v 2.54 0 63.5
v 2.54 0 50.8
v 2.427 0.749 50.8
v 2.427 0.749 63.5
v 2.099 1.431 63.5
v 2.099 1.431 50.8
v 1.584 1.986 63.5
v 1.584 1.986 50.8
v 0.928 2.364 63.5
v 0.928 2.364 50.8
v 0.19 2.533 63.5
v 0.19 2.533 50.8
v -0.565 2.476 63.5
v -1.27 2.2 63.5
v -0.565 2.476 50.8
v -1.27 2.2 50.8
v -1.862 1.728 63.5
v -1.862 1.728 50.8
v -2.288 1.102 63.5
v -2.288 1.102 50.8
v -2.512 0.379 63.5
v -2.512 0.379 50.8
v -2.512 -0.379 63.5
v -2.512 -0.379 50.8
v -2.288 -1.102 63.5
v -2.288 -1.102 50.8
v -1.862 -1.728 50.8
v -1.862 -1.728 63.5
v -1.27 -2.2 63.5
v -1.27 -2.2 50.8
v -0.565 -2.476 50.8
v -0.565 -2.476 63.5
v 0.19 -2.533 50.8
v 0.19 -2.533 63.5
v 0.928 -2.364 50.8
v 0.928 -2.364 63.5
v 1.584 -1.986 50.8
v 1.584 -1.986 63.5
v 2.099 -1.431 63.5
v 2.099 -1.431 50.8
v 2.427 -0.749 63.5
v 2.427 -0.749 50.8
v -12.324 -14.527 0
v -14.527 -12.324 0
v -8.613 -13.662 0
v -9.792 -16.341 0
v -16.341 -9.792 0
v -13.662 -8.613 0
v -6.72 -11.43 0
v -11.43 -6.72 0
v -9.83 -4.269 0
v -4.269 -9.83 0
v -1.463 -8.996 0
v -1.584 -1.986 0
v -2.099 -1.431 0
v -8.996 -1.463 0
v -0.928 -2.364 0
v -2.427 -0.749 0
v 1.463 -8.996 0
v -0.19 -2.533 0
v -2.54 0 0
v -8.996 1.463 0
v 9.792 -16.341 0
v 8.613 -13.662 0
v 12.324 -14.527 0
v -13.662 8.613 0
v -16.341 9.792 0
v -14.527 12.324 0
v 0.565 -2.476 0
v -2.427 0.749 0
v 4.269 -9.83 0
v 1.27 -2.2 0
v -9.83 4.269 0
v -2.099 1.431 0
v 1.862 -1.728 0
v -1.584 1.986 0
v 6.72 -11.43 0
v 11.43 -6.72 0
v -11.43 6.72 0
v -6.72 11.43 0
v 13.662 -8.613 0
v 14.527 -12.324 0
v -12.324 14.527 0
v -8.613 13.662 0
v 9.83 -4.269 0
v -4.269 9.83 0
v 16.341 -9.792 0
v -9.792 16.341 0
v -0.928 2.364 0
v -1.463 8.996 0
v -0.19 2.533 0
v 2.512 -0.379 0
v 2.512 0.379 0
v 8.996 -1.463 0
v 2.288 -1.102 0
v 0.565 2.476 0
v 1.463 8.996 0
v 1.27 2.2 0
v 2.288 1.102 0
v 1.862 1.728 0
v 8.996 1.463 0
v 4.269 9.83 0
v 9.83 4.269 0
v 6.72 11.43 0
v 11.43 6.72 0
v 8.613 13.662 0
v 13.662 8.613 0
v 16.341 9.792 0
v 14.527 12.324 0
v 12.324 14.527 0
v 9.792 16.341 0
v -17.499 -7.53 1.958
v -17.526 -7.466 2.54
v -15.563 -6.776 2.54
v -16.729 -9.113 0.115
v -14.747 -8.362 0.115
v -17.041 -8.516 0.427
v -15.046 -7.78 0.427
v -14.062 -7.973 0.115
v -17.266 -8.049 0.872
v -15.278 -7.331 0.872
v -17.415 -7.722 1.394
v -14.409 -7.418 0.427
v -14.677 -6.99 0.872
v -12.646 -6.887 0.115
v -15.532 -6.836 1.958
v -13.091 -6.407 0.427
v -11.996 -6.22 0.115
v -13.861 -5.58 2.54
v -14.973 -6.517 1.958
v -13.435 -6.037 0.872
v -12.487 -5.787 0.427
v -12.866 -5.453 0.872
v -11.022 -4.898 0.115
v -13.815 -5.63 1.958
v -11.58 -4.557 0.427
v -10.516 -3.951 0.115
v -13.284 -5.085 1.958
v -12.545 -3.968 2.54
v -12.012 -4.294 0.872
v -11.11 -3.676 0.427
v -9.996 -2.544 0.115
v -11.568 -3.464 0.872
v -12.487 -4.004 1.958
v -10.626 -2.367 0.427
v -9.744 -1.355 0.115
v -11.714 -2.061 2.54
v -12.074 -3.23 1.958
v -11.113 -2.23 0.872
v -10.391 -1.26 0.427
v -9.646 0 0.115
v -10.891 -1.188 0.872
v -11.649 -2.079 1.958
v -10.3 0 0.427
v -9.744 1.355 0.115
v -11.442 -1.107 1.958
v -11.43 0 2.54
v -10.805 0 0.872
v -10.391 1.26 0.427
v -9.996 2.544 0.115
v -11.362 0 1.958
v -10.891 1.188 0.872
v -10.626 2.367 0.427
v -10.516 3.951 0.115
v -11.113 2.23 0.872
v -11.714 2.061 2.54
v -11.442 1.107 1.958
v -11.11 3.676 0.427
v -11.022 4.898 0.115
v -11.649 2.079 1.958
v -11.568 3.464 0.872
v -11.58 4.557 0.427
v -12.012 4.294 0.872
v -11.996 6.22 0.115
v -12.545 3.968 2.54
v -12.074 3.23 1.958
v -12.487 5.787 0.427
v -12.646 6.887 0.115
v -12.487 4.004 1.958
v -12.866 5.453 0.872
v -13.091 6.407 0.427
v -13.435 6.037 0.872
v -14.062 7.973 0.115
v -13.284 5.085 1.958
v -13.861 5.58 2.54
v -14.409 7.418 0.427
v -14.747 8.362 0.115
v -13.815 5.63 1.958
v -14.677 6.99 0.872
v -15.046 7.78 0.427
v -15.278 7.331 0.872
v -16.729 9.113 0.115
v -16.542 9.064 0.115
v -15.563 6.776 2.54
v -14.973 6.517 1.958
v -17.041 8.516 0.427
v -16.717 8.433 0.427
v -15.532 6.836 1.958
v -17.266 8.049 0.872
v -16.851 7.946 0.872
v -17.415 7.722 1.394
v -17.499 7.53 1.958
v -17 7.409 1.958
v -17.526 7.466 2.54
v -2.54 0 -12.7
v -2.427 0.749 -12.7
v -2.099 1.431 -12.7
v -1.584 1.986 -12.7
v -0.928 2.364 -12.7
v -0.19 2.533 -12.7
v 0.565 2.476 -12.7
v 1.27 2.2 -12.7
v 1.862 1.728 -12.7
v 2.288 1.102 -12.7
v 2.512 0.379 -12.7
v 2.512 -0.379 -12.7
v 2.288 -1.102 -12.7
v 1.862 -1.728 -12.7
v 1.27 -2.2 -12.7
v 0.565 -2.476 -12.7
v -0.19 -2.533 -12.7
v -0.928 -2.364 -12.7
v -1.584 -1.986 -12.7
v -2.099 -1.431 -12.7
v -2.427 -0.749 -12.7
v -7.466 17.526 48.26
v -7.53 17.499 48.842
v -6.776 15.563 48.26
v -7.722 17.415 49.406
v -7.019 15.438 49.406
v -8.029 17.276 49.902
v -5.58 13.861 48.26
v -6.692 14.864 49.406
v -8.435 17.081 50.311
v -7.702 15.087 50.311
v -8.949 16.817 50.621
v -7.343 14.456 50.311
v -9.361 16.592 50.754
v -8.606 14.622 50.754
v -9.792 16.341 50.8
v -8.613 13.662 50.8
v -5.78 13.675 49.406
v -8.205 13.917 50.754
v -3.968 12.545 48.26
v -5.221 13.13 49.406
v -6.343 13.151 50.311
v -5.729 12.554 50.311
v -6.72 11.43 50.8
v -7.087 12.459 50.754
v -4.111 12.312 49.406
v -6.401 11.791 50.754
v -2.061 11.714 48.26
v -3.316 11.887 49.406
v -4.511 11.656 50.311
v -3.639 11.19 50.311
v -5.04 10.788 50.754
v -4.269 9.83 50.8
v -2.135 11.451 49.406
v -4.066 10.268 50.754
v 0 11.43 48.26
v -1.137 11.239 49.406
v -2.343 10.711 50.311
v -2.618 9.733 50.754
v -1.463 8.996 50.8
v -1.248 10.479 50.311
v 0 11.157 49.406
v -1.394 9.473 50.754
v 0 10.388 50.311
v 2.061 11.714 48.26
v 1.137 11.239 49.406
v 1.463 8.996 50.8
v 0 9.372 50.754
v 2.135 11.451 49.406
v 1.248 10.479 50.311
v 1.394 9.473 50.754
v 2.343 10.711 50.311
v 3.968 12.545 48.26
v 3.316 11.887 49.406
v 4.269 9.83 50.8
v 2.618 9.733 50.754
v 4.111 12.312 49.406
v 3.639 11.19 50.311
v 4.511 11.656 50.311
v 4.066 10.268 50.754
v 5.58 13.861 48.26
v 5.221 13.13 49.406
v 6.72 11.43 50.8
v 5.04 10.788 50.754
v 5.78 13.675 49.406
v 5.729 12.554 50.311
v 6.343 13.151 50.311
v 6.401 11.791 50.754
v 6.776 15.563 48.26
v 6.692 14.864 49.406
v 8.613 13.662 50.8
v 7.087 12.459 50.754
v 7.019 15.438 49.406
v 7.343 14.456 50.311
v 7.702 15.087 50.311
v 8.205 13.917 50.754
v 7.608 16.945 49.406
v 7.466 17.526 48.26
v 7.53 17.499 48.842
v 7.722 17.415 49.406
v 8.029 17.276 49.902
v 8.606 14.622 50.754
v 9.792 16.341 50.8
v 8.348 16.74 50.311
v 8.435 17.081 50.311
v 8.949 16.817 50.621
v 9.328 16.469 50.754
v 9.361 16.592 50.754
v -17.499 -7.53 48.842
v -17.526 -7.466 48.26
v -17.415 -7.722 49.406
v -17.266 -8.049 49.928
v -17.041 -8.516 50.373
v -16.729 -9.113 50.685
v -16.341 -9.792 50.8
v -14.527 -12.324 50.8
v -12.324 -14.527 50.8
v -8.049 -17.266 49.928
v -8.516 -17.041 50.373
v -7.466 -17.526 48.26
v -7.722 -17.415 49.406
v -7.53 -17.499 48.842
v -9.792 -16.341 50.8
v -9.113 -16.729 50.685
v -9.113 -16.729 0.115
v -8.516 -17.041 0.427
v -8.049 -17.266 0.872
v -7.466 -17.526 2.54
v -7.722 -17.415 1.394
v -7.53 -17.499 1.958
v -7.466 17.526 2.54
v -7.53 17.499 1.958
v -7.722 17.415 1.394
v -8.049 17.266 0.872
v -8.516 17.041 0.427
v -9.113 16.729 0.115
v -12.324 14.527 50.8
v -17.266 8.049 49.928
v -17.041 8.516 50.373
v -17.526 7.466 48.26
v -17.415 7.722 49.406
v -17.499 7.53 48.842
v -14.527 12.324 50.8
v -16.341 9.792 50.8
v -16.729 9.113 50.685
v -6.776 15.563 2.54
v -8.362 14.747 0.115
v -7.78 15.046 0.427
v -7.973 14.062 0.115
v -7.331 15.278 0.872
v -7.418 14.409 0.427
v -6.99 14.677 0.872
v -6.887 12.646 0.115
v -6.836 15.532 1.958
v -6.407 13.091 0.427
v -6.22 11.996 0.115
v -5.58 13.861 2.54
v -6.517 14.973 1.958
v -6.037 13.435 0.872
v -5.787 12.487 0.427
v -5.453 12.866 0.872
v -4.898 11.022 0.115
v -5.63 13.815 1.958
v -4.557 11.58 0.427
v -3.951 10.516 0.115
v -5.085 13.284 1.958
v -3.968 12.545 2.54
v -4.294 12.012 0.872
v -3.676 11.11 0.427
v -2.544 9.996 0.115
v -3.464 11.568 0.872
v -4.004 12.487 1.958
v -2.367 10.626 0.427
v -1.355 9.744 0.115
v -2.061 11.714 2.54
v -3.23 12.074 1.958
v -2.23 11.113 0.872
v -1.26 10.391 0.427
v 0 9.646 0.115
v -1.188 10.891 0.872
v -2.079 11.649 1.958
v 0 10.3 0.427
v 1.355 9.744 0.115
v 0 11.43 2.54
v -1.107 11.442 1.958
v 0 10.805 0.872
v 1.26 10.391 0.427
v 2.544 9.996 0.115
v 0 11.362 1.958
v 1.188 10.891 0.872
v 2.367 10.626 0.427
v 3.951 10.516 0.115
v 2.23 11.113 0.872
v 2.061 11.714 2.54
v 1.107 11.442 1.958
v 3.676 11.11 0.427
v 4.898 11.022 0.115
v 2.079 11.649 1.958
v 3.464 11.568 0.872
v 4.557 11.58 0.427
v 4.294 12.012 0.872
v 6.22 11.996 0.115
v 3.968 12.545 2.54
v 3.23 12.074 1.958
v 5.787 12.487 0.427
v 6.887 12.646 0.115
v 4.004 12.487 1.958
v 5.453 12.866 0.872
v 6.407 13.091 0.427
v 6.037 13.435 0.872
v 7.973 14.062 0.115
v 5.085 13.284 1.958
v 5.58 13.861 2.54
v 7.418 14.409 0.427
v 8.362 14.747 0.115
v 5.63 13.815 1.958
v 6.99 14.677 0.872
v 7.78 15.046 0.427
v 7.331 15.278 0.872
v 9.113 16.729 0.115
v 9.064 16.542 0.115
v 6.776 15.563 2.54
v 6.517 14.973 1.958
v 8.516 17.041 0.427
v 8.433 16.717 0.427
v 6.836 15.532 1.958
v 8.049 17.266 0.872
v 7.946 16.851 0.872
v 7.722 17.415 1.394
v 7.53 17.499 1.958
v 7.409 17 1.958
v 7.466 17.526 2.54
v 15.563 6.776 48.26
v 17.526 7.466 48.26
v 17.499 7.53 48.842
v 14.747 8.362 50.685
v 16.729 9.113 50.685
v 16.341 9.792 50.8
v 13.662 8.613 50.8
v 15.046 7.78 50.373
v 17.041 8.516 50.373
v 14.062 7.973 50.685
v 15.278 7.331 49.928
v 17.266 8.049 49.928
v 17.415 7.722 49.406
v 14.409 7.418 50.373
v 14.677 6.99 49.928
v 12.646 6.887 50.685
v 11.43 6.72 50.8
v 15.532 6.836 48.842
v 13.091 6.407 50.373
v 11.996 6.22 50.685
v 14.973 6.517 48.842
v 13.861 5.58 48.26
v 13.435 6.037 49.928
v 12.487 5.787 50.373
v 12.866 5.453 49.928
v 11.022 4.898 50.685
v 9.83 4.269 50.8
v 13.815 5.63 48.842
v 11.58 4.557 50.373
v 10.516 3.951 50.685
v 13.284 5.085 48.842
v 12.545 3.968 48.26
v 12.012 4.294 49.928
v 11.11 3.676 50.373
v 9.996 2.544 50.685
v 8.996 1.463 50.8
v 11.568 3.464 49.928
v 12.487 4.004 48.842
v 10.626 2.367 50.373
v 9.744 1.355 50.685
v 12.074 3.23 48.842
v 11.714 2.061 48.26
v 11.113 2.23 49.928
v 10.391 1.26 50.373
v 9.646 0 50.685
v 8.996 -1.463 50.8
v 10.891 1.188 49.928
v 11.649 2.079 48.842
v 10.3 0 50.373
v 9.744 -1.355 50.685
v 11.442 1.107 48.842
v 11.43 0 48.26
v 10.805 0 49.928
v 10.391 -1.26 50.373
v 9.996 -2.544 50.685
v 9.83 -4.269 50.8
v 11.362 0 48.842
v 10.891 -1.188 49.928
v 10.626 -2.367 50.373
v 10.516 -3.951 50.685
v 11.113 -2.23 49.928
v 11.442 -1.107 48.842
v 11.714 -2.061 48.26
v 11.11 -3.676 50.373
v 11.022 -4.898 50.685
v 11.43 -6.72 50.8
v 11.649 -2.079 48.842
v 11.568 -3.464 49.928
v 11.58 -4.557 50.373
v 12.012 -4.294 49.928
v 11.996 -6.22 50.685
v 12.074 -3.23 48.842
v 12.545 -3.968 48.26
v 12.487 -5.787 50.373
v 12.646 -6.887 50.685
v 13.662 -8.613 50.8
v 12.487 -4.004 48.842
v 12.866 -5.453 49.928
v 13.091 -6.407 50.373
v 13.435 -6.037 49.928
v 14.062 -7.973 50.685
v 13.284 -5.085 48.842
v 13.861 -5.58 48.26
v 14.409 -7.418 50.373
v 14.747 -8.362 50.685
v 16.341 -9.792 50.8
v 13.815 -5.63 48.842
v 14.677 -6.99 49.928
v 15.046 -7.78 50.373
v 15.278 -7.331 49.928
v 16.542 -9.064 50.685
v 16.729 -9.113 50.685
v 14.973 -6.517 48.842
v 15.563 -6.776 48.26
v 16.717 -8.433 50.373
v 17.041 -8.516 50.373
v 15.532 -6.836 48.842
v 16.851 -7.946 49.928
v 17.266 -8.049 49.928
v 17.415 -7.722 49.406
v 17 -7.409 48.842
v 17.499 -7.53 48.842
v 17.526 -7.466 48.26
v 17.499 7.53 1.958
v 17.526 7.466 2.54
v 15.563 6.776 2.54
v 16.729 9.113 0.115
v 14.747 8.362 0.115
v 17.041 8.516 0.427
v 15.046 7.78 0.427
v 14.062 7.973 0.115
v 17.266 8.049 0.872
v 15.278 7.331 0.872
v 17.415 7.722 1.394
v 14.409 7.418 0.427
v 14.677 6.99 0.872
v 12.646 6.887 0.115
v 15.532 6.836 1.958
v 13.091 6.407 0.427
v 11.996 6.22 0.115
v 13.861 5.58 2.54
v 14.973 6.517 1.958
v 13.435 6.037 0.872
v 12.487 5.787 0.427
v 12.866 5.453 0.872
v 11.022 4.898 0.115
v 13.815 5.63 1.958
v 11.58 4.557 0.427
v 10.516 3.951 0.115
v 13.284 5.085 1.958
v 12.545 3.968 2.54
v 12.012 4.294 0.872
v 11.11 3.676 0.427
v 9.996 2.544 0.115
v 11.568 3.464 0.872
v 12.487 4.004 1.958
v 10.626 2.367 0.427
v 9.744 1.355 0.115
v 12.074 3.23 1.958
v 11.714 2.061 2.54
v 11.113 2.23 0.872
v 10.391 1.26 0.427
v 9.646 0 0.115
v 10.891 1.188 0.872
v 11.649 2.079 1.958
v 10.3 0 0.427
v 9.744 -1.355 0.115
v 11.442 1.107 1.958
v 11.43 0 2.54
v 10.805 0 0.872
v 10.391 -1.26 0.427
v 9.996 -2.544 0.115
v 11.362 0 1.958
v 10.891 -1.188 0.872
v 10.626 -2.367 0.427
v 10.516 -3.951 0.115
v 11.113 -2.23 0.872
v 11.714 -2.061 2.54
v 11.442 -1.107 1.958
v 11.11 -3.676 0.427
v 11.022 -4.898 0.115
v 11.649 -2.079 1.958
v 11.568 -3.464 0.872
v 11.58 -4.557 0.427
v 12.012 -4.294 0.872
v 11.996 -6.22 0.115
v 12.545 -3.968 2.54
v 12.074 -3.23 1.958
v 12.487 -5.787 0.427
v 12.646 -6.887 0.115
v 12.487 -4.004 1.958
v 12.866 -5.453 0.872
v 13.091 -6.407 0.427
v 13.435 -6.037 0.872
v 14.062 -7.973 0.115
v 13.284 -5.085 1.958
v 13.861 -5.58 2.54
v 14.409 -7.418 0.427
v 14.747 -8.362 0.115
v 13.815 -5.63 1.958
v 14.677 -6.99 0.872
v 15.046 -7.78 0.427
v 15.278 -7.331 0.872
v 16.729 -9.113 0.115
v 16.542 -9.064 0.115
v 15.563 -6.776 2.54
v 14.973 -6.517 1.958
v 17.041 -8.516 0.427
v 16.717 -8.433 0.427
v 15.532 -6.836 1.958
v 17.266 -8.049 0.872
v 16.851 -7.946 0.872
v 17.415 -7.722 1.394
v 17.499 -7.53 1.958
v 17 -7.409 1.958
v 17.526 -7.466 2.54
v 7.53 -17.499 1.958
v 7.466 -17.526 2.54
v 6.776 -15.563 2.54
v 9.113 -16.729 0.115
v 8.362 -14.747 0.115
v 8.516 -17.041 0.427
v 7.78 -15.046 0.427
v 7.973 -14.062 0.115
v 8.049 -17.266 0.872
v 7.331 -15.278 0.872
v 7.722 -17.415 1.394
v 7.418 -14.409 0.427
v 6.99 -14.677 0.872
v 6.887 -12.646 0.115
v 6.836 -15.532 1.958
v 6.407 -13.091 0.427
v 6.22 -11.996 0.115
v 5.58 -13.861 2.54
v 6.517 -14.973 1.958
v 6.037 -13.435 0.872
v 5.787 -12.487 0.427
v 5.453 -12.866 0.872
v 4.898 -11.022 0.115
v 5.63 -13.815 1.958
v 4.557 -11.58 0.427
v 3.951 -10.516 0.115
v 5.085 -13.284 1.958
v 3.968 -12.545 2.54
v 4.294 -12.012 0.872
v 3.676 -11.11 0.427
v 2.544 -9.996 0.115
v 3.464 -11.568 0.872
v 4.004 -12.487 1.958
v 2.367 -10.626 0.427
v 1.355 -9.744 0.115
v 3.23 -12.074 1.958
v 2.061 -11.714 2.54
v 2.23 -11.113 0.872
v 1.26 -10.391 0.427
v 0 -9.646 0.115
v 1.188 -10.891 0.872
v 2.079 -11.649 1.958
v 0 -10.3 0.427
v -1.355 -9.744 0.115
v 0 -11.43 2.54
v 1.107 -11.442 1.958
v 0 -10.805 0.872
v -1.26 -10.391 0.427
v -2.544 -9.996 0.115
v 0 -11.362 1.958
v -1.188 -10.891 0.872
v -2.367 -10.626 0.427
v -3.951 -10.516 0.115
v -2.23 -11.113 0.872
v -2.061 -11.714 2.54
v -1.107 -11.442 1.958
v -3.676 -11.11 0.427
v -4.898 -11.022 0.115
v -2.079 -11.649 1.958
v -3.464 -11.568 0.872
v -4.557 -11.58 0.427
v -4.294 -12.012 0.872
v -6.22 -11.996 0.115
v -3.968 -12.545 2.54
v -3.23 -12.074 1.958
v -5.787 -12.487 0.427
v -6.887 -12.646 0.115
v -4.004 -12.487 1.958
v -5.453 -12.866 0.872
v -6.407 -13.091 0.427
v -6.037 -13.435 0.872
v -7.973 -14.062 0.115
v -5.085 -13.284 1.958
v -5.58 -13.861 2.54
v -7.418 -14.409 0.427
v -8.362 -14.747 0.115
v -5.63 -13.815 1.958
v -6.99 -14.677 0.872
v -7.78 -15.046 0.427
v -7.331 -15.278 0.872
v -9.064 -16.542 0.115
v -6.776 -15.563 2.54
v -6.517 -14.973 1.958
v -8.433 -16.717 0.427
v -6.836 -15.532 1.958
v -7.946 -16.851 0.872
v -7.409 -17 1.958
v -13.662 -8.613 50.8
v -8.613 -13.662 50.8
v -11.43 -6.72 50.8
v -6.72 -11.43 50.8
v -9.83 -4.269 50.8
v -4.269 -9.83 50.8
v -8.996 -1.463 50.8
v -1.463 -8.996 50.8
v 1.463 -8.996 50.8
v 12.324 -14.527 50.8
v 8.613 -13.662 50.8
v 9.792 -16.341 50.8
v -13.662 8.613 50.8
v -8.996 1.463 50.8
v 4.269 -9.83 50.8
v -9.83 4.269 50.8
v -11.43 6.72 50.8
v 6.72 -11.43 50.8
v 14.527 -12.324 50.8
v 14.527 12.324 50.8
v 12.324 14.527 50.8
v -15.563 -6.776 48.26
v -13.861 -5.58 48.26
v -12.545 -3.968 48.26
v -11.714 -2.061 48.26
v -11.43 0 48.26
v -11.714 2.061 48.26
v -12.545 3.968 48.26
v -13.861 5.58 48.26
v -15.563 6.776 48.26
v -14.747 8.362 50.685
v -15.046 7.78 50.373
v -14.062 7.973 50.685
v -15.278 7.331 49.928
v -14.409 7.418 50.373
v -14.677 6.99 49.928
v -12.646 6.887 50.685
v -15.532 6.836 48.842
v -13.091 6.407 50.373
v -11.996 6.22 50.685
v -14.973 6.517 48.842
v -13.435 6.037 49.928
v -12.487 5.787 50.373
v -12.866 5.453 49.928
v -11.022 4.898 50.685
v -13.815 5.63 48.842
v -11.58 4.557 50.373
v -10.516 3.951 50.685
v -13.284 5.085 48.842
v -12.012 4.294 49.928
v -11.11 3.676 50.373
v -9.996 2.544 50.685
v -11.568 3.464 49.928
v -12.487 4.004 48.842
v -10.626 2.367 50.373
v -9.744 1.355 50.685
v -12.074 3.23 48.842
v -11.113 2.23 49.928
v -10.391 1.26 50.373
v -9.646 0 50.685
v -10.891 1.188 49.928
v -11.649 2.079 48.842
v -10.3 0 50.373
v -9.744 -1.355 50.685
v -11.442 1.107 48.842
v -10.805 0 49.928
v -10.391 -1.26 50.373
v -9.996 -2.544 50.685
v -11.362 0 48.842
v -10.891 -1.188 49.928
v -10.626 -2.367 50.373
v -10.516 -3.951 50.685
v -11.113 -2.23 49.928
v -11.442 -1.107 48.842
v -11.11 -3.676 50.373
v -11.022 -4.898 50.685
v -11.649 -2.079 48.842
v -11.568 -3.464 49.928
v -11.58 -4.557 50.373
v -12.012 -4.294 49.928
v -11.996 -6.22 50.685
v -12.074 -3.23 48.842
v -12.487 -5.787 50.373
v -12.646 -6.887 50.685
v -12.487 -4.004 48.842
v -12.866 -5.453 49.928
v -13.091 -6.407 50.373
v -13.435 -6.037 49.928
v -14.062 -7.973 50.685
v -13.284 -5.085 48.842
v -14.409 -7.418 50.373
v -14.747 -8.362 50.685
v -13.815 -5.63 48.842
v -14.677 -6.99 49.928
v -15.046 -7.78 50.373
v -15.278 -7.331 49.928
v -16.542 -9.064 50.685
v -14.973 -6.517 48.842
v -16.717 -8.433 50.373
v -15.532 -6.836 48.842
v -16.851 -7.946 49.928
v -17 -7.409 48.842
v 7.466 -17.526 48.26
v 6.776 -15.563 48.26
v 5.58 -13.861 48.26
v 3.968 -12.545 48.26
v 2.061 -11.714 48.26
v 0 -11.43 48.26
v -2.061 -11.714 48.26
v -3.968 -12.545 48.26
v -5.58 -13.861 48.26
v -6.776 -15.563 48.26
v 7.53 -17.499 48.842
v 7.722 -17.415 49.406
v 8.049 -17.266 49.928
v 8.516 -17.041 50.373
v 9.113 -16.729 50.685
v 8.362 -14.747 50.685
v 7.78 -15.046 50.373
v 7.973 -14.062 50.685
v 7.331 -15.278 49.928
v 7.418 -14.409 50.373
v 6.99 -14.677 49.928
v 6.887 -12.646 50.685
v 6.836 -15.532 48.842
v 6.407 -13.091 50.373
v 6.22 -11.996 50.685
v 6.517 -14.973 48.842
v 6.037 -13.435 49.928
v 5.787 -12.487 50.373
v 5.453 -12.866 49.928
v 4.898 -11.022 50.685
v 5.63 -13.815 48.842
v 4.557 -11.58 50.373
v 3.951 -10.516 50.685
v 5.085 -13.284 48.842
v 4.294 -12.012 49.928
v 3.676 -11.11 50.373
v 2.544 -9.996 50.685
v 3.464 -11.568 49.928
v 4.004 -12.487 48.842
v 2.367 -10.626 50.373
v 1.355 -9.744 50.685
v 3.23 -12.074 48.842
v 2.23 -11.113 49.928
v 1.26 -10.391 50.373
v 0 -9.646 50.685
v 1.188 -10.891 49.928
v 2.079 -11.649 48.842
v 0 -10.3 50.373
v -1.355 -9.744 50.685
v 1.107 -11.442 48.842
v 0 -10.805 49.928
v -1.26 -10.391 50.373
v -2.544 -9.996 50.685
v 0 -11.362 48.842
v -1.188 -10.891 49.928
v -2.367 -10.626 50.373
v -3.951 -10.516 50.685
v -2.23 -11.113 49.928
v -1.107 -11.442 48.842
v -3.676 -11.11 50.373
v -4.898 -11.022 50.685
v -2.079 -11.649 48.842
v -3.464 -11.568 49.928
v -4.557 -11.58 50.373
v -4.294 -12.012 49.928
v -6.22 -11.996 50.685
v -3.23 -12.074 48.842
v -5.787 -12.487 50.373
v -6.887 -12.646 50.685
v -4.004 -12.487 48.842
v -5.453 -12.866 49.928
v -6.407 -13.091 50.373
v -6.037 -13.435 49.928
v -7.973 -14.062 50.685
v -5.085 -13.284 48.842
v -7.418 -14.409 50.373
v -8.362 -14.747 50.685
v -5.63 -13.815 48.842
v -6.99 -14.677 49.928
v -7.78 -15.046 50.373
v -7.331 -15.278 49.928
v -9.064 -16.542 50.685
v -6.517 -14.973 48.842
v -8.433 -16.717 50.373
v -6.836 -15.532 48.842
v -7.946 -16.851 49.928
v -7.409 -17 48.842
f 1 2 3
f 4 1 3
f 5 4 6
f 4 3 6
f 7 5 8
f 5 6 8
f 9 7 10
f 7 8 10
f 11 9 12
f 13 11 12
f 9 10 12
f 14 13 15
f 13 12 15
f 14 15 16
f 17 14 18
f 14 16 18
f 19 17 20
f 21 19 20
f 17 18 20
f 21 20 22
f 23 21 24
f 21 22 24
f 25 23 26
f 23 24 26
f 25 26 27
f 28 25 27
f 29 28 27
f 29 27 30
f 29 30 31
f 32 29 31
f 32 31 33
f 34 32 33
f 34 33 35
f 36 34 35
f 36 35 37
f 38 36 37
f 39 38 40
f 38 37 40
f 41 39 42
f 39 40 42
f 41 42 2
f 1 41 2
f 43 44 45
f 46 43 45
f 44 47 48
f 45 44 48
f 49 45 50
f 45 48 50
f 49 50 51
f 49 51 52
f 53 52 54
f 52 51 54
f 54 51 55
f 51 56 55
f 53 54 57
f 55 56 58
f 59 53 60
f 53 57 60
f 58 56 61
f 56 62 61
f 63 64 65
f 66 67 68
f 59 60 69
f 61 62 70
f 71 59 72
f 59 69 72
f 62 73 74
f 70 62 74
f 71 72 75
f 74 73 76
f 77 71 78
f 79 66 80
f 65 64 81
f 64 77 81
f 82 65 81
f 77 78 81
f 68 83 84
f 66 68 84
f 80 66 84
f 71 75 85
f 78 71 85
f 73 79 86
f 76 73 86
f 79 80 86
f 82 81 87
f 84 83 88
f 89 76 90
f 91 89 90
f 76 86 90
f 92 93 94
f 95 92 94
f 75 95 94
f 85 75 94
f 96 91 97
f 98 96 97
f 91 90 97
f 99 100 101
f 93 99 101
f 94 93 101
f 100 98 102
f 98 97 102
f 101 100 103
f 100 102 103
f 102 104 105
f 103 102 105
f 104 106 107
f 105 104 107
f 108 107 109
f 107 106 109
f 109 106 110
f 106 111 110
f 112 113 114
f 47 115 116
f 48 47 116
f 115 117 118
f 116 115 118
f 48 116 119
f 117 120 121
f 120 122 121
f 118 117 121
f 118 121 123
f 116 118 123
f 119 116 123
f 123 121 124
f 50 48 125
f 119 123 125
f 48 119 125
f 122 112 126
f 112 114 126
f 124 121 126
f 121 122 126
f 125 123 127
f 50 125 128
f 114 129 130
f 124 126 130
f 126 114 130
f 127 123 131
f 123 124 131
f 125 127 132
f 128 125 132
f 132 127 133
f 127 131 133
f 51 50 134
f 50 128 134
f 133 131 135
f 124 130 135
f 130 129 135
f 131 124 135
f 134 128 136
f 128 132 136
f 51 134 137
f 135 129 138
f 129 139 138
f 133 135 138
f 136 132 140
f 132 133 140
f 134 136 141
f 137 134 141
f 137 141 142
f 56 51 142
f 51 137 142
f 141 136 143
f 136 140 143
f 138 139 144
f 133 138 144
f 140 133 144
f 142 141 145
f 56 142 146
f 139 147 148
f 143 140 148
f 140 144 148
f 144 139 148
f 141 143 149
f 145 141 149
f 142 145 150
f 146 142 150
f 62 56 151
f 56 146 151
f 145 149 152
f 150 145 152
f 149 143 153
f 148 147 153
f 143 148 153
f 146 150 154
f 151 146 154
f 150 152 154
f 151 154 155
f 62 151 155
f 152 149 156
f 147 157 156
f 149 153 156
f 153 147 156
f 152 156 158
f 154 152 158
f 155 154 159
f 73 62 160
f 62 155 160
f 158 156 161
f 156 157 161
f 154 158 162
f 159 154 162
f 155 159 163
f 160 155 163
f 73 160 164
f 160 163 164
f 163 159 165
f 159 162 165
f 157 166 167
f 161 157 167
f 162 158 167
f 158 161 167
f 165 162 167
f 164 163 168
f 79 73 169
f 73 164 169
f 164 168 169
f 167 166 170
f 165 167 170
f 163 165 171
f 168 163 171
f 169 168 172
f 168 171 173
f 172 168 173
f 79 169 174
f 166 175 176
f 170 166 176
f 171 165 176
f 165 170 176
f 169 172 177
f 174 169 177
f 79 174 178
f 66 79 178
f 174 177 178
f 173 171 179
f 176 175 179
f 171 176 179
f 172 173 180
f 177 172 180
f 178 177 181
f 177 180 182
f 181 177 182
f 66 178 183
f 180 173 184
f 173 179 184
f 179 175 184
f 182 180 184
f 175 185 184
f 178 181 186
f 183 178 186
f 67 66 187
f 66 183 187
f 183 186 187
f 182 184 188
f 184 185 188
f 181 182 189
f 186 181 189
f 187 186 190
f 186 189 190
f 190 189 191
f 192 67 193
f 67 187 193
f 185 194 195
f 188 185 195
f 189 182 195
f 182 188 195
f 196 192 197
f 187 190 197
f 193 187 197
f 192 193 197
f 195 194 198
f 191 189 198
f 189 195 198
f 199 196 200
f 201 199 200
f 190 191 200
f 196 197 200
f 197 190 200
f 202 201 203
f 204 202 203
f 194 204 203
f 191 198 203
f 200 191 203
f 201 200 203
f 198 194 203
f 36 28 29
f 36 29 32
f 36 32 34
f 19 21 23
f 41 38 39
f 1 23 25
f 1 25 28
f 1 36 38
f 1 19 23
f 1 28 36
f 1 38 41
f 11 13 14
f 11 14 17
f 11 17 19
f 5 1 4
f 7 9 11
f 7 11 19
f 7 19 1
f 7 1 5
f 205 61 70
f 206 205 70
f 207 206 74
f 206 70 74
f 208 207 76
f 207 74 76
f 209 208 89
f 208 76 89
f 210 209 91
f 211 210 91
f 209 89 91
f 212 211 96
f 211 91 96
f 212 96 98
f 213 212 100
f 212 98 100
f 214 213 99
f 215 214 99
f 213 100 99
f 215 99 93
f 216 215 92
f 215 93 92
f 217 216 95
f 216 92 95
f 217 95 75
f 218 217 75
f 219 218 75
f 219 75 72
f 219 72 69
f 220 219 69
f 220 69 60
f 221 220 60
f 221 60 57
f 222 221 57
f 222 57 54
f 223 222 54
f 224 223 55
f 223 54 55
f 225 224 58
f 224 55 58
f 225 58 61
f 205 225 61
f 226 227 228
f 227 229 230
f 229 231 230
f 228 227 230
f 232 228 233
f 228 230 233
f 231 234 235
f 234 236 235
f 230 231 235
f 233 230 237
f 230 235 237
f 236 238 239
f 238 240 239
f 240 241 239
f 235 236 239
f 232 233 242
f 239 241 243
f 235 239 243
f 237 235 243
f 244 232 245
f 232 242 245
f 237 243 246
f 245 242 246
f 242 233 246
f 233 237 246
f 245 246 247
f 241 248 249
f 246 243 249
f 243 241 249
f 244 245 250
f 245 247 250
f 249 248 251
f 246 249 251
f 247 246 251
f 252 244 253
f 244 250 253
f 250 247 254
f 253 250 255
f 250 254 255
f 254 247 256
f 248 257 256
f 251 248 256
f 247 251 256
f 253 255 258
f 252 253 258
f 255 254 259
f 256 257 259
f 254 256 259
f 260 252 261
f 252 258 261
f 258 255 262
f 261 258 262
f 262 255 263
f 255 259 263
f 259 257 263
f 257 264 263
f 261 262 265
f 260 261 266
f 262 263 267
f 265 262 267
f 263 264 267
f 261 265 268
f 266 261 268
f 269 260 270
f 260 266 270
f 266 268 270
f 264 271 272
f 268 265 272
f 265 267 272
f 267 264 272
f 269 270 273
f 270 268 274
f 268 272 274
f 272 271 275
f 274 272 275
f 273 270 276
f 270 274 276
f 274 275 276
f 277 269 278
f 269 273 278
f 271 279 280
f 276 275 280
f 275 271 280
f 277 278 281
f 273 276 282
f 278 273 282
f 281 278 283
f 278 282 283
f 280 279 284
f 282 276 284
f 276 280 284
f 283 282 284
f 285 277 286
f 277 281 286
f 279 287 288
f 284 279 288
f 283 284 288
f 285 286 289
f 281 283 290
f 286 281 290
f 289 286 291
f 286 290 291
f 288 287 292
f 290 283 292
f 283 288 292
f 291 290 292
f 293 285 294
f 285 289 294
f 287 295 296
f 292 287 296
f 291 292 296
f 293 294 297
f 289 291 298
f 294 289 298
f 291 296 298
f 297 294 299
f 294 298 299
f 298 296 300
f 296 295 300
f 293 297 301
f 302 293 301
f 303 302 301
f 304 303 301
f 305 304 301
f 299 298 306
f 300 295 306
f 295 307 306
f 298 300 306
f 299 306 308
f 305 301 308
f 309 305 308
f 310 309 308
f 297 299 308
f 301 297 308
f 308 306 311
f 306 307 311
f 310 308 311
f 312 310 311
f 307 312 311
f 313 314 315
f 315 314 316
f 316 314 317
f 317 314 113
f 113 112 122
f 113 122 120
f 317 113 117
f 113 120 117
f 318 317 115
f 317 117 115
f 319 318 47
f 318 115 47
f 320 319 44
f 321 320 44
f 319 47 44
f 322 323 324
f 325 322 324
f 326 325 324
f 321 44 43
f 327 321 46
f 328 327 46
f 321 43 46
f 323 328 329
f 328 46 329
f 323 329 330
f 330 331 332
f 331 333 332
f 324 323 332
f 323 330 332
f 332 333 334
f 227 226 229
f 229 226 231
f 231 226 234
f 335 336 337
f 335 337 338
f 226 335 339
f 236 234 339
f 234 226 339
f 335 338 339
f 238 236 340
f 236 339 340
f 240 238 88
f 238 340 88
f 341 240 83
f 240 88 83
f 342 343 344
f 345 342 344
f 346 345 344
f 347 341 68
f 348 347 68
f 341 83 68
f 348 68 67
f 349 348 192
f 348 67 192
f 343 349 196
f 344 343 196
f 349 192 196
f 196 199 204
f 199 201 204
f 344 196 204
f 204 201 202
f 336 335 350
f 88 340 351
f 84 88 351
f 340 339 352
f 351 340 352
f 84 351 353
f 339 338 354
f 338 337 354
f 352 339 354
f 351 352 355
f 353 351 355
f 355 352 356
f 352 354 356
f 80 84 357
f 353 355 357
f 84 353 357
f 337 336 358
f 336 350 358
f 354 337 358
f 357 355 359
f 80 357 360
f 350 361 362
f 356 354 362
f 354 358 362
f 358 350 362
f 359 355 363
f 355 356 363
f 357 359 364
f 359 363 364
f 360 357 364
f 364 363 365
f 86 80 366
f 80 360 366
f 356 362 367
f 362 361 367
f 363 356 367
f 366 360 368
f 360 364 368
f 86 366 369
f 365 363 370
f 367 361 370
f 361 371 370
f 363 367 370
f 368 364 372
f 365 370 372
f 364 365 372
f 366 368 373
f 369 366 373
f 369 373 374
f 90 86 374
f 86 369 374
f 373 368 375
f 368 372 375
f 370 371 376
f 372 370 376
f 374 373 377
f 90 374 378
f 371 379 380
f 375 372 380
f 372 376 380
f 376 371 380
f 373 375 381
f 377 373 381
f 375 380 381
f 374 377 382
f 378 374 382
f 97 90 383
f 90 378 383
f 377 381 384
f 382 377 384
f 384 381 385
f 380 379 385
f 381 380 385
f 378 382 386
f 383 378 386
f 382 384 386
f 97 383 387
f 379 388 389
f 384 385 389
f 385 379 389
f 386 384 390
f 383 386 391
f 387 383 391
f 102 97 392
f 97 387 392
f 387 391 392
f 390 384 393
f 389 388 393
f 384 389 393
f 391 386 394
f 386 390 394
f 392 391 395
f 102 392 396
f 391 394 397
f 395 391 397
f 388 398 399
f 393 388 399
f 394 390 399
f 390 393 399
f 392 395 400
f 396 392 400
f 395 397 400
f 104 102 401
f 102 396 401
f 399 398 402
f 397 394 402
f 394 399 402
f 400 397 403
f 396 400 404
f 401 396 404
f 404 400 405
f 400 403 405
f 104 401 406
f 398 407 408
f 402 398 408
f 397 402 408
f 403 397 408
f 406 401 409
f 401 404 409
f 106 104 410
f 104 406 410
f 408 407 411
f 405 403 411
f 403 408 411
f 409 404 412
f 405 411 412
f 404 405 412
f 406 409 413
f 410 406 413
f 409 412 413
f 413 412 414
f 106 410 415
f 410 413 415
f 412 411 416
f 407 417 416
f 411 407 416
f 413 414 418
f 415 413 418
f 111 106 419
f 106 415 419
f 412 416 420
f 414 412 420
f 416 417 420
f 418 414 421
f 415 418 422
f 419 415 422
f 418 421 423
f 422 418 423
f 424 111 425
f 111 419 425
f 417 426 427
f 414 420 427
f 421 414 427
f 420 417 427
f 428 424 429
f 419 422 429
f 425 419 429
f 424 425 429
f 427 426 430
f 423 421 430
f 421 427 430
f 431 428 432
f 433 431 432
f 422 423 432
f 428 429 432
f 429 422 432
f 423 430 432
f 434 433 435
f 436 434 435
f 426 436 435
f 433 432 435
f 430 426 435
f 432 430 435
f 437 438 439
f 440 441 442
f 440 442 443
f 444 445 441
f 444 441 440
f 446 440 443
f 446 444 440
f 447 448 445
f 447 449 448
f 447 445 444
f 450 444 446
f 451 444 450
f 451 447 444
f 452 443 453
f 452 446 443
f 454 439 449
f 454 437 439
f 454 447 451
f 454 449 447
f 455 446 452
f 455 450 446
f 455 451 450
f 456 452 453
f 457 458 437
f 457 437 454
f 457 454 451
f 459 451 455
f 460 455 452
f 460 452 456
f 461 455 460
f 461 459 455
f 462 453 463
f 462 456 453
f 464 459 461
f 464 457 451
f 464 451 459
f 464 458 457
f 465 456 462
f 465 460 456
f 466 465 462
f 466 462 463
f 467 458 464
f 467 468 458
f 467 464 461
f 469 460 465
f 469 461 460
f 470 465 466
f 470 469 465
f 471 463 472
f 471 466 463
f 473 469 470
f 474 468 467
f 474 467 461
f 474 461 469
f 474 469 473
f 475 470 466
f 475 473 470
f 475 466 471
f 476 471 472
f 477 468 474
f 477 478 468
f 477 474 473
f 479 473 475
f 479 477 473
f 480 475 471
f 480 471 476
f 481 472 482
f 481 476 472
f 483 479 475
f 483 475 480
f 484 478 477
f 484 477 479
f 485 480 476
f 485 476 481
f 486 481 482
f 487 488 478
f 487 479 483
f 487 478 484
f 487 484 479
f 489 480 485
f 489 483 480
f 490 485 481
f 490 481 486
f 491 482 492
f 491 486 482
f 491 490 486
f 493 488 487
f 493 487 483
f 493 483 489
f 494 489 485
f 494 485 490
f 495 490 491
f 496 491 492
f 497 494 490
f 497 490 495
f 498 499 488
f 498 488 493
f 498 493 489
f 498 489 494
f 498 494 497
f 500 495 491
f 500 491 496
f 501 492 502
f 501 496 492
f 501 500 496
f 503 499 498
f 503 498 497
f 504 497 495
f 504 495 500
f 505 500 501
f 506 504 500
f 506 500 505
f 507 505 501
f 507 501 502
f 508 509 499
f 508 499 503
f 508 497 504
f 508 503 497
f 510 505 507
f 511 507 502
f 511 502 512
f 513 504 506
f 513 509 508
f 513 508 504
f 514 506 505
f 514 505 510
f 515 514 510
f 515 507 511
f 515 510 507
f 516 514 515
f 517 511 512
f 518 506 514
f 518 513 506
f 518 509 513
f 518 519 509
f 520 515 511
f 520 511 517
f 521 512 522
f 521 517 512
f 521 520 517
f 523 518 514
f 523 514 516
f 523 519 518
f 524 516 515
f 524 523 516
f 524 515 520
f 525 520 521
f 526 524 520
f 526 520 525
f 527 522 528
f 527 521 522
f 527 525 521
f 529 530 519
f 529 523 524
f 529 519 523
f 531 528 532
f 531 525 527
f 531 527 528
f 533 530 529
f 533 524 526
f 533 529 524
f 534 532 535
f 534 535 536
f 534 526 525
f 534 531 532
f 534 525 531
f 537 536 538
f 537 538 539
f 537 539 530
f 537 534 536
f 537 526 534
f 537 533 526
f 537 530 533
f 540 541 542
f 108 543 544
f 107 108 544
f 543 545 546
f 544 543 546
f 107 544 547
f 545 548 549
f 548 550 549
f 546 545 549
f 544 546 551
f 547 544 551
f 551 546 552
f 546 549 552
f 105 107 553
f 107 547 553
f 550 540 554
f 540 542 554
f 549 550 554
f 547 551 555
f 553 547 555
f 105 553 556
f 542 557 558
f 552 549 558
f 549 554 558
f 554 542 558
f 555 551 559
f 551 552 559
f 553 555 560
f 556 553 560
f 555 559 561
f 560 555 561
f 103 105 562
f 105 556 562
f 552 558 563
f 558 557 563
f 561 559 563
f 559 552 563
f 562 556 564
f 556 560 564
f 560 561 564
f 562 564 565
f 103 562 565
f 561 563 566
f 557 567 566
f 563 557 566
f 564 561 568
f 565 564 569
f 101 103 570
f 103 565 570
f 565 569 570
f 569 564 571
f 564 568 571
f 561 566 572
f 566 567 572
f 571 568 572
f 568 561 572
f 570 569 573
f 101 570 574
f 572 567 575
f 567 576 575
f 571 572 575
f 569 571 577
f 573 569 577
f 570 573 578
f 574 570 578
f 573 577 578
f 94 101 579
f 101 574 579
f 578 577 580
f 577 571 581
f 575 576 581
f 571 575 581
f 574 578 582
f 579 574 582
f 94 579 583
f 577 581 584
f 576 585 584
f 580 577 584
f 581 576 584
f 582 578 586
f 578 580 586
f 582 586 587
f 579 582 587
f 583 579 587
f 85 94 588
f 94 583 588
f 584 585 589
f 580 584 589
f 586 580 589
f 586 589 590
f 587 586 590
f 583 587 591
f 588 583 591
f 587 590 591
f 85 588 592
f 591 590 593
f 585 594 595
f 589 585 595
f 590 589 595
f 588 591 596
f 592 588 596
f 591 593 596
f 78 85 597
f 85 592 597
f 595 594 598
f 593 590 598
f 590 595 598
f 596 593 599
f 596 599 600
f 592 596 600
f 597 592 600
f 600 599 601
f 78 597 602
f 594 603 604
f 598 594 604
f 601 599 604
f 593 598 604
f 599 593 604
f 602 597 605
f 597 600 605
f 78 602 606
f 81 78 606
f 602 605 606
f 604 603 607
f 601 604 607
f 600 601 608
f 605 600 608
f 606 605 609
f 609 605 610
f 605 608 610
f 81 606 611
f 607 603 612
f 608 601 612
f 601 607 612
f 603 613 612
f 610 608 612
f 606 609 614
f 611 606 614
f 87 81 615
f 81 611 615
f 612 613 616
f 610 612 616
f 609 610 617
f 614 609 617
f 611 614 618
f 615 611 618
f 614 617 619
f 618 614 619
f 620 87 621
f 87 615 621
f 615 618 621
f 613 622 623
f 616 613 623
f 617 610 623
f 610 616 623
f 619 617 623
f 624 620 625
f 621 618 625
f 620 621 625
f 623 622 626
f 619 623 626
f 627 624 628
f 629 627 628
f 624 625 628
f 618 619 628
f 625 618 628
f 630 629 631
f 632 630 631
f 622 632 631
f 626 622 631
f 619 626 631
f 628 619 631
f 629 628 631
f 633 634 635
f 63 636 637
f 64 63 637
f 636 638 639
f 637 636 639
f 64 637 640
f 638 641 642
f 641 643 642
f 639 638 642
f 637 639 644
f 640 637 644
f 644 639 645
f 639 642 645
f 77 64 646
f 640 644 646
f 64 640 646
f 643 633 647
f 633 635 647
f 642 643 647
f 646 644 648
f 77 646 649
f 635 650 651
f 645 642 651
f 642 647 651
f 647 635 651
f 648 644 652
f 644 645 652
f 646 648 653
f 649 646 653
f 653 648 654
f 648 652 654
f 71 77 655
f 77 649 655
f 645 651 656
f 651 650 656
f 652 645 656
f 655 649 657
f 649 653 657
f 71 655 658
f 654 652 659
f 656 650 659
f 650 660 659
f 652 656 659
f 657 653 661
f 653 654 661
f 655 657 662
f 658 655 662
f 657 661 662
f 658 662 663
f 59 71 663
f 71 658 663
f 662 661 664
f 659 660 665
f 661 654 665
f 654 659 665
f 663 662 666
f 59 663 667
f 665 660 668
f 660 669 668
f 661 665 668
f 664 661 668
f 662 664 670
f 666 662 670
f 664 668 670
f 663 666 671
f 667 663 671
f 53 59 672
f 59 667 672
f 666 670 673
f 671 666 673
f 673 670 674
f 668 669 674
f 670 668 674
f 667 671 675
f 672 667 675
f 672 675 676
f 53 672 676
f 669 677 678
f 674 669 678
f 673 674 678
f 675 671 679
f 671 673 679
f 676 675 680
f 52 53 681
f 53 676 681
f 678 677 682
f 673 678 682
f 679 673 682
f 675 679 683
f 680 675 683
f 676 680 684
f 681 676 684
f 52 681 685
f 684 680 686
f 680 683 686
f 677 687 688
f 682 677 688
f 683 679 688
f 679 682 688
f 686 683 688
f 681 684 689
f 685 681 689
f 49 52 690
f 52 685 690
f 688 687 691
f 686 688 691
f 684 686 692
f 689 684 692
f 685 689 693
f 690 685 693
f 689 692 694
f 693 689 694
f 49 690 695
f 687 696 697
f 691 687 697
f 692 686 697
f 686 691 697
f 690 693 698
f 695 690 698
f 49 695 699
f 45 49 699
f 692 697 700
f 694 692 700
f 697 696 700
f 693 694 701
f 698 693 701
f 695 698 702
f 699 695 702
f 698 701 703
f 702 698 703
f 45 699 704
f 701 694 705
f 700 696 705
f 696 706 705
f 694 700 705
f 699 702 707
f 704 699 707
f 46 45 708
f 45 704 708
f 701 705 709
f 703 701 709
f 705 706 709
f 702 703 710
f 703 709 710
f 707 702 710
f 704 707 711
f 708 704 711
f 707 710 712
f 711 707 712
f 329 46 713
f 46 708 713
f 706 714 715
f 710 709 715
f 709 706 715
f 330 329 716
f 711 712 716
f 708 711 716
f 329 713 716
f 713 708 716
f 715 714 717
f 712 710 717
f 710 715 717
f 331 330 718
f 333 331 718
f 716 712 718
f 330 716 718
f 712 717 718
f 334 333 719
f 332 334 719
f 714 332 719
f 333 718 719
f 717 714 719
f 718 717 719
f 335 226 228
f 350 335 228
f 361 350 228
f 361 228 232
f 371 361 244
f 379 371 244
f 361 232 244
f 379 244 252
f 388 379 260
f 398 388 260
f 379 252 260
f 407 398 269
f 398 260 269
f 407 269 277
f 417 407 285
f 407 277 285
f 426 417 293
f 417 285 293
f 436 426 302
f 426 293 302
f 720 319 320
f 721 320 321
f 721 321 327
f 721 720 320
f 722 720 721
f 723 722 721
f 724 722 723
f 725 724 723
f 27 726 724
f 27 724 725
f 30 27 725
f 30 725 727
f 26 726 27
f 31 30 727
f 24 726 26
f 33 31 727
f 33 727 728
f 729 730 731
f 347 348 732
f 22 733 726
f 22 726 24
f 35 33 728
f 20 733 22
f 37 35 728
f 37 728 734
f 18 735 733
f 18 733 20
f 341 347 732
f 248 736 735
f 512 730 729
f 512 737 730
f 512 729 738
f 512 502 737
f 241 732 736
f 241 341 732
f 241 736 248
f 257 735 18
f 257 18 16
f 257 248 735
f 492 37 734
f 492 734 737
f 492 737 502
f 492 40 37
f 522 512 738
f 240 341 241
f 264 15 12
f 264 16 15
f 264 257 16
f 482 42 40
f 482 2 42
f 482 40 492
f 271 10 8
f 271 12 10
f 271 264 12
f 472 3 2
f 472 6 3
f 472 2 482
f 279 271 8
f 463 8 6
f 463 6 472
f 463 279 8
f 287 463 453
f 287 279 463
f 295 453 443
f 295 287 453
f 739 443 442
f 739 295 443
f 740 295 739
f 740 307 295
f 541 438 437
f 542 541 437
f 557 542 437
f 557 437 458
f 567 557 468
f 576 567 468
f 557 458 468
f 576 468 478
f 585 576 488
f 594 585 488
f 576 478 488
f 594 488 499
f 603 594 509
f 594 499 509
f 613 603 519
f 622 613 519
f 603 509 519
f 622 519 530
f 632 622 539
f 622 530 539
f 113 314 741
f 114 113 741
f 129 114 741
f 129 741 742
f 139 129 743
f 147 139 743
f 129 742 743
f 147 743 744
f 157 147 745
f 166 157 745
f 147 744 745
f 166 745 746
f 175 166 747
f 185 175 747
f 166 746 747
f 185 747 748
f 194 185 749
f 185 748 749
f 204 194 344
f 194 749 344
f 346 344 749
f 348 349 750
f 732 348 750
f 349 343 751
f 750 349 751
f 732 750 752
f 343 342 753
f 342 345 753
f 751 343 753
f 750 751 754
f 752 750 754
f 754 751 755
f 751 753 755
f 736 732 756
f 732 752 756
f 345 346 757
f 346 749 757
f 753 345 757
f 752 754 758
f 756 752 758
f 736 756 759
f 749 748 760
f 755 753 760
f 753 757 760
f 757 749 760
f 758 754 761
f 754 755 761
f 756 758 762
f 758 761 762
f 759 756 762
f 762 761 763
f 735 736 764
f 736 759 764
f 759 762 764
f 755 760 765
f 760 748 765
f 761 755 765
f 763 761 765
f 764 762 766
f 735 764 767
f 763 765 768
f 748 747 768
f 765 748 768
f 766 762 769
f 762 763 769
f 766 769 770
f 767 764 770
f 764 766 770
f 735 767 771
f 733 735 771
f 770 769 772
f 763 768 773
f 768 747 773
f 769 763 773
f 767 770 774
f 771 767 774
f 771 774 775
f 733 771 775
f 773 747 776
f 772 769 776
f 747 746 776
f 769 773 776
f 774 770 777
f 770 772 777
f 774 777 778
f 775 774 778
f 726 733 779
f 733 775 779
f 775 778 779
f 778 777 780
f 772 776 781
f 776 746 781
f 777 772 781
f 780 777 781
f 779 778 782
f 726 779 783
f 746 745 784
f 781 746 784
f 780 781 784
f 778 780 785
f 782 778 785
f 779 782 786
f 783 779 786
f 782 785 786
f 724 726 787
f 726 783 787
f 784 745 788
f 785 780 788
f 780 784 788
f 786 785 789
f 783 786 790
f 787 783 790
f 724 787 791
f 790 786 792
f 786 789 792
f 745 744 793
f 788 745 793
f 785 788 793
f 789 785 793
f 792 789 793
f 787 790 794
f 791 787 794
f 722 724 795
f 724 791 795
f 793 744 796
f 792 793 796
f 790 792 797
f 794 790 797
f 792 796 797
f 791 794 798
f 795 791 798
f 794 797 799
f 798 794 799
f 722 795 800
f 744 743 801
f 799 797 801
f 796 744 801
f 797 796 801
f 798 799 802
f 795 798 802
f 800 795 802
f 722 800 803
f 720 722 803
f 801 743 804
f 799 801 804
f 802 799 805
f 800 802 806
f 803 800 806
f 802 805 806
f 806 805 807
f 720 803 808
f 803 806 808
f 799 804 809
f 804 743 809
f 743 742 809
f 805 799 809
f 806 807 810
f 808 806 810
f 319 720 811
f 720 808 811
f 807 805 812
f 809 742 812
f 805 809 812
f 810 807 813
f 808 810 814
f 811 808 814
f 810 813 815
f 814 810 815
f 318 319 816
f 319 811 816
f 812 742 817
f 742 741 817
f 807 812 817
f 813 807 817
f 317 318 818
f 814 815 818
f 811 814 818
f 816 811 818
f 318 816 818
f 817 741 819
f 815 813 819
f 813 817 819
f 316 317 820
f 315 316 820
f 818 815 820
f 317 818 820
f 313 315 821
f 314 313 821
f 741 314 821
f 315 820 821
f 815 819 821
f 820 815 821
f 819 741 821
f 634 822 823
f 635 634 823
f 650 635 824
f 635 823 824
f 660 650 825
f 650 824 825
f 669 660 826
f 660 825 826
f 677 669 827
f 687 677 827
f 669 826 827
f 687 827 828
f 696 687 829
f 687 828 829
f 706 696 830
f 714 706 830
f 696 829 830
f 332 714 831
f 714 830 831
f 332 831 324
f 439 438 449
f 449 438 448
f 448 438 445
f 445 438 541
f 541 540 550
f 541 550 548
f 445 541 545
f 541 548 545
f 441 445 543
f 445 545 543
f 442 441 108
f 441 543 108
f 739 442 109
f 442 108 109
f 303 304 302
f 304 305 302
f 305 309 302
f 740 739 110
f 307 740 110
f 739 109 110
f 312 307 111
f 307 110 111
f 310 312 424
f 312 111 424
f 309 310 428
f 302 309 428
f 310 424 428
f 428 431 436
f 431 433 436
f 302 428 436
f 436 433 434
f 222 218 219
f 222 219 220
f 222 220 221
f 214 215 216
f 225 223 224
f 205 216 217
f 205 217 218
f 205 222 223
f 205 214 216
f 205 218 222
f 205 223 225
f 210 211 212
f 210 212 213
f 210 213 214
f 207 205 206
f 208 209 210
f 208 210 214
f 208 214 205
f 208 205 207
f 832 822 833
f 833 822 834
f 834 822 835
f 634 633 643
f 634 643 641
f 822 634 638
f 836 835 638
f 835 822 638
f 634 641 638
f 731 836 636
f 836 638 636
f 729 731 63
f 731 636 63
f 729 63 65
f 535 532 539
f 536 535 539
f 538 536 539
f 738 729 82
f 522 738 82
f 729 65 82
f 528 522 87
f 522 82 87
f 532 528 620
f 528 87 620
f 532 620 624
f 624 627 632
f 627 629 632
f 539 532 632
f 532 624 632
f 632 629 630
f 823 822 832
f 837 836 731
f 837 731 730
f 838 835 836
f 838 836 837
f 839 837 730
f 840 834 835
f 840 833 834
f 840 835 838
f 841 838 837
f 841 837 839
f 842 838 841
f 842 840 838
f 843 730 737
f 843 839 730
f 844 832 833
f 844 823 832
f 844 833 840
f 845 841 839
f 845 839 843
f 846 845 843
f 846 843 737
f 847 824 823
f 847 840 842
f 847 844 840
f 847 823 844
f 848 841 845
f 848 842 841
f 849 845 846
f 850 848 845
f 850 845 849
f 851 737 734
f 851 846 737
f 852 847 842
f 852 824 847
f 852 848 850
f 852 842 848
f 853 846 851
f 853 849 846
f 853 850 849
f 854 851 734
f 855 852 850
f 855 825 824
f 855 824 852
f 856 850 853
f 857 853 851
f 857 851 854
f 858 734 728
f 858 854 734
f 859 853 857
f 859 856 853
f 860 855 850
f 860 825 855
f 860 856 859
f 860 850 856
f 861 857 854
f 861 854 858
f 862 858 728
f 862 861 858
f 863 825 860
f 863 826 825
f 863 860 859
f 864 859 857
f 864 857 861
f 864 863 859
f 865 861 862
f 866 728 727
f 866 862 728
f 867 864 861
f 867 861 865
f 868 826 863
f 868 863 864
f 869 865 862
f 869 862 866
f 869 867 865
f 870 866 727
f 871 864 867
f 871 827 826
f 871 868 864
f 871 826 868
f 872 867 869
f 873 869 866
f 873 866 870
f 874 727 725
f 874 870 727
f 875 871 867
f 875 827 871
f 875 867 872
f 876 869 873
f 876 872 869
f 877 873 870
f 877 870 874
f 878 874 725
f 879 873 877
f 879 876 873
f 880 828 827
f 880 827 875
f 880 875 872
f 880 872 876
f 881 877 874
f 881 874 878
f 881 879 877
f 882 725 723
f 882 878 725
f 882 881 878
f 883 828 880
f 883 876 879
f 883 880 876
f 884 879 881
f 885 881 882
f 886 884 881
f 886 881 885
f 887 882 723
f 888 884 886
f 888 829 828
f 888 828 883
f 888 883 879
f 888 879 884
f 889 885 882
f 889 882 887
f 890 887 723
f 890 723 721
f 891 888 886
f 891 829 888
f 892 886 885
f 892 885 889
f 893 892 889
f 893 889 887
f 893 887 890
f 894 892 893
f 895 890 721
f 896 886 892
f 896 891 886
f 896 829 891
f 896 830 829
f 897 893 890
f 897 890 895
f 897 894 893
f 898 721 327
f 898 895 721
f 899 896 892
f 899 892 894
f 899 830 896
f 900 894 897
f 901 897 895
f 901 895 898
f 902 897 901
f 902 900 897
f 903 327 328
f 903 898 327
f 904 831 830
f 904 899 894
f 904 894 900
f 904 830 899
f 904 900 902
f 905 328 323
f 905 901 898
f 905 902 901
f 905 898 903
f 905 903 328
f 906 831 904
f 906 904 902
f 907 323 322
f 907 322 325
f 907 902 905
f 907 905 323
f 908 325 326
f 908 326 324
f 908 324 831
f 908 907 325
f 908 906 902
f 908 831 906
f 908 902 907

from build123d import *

# Parameters (mm, degrees)
SKETCH2_R           = 19.05
BOSS_EXTRUDE1_DEPTH = 50.8
SKETCH5_R           = 7.62
CUT_EXTRUDE2_DEPTH  = 51.8
SKETCH6_R           = 2.54
BOSS_EXTRUDE2_DEPTH = 12.7
SKETCH7_R           = 2.54
BOSS_EXTRUDE3_DEPTH = 12.7
FILLET1_R           = 2.54


with BuildPart() as part:
    # Sketch2 → Boss-Extrude1 (new body)
    with BuildSketch(Plane.XY):
        Circle(SKETCH2_R)
    extrude(amount=BOSS_EXTRUDE1_DEPTH)

    # Sketch5 → Cut-Extrude2 (cut, through all)
    with BuildSketch(Plane.XY.offset(50.8)):
        with Locations((0, 19.05)):
            Circle(SKETCH5_R)
        with Locations((19.05, 0)):
            Circle(SKETCH5_R)
        with Locations((0, -19.05)):
            Circle(SKETCH5_R)
        with Locations((-19.05, 0)):
            Circle(SKETCH5_R)
    extrude(amount=-CUT_EXTRUDE2_DEPTH, mode=Mode.SUBTRACT)

    # Sketch6 → Boss-Extrude2 (add)
    with BuildSketch(Plane.XY.offset(50.8)):
        Circle(SKETCH6_R)
    extrude(amount=BOSS_EXTRUDE2_DEPTH)

    # Sketch7 → Boss-Extrude3 (add)
    with BuildSketch(Plane(origin=(0, 0, 0), x_dir=(-1, 0, 0), z_dir=(0, 0, -1))):
        Circle(SKETCH7_R)
    extrude(amount=BOSS_EXTRUDE3_DEPTH)

    # Fillet1
    fillet1_edges = [part.edges().sort_by_distance(p)[0] for p in [
        (0, 11.43, 50.8),
        (0, 11.43, 0),
        (11.43, 0, 50.8),
        (11.43, 0, 0),
        (0, -11.43, 50.8),
        (0, -11.43, 0),
        (-11.43, 0, 50.8),
        (-11.43, 0, 0),
    ]]
    fillet(fillet1_edges, radius=FILLET1_R)


solid = part.part
